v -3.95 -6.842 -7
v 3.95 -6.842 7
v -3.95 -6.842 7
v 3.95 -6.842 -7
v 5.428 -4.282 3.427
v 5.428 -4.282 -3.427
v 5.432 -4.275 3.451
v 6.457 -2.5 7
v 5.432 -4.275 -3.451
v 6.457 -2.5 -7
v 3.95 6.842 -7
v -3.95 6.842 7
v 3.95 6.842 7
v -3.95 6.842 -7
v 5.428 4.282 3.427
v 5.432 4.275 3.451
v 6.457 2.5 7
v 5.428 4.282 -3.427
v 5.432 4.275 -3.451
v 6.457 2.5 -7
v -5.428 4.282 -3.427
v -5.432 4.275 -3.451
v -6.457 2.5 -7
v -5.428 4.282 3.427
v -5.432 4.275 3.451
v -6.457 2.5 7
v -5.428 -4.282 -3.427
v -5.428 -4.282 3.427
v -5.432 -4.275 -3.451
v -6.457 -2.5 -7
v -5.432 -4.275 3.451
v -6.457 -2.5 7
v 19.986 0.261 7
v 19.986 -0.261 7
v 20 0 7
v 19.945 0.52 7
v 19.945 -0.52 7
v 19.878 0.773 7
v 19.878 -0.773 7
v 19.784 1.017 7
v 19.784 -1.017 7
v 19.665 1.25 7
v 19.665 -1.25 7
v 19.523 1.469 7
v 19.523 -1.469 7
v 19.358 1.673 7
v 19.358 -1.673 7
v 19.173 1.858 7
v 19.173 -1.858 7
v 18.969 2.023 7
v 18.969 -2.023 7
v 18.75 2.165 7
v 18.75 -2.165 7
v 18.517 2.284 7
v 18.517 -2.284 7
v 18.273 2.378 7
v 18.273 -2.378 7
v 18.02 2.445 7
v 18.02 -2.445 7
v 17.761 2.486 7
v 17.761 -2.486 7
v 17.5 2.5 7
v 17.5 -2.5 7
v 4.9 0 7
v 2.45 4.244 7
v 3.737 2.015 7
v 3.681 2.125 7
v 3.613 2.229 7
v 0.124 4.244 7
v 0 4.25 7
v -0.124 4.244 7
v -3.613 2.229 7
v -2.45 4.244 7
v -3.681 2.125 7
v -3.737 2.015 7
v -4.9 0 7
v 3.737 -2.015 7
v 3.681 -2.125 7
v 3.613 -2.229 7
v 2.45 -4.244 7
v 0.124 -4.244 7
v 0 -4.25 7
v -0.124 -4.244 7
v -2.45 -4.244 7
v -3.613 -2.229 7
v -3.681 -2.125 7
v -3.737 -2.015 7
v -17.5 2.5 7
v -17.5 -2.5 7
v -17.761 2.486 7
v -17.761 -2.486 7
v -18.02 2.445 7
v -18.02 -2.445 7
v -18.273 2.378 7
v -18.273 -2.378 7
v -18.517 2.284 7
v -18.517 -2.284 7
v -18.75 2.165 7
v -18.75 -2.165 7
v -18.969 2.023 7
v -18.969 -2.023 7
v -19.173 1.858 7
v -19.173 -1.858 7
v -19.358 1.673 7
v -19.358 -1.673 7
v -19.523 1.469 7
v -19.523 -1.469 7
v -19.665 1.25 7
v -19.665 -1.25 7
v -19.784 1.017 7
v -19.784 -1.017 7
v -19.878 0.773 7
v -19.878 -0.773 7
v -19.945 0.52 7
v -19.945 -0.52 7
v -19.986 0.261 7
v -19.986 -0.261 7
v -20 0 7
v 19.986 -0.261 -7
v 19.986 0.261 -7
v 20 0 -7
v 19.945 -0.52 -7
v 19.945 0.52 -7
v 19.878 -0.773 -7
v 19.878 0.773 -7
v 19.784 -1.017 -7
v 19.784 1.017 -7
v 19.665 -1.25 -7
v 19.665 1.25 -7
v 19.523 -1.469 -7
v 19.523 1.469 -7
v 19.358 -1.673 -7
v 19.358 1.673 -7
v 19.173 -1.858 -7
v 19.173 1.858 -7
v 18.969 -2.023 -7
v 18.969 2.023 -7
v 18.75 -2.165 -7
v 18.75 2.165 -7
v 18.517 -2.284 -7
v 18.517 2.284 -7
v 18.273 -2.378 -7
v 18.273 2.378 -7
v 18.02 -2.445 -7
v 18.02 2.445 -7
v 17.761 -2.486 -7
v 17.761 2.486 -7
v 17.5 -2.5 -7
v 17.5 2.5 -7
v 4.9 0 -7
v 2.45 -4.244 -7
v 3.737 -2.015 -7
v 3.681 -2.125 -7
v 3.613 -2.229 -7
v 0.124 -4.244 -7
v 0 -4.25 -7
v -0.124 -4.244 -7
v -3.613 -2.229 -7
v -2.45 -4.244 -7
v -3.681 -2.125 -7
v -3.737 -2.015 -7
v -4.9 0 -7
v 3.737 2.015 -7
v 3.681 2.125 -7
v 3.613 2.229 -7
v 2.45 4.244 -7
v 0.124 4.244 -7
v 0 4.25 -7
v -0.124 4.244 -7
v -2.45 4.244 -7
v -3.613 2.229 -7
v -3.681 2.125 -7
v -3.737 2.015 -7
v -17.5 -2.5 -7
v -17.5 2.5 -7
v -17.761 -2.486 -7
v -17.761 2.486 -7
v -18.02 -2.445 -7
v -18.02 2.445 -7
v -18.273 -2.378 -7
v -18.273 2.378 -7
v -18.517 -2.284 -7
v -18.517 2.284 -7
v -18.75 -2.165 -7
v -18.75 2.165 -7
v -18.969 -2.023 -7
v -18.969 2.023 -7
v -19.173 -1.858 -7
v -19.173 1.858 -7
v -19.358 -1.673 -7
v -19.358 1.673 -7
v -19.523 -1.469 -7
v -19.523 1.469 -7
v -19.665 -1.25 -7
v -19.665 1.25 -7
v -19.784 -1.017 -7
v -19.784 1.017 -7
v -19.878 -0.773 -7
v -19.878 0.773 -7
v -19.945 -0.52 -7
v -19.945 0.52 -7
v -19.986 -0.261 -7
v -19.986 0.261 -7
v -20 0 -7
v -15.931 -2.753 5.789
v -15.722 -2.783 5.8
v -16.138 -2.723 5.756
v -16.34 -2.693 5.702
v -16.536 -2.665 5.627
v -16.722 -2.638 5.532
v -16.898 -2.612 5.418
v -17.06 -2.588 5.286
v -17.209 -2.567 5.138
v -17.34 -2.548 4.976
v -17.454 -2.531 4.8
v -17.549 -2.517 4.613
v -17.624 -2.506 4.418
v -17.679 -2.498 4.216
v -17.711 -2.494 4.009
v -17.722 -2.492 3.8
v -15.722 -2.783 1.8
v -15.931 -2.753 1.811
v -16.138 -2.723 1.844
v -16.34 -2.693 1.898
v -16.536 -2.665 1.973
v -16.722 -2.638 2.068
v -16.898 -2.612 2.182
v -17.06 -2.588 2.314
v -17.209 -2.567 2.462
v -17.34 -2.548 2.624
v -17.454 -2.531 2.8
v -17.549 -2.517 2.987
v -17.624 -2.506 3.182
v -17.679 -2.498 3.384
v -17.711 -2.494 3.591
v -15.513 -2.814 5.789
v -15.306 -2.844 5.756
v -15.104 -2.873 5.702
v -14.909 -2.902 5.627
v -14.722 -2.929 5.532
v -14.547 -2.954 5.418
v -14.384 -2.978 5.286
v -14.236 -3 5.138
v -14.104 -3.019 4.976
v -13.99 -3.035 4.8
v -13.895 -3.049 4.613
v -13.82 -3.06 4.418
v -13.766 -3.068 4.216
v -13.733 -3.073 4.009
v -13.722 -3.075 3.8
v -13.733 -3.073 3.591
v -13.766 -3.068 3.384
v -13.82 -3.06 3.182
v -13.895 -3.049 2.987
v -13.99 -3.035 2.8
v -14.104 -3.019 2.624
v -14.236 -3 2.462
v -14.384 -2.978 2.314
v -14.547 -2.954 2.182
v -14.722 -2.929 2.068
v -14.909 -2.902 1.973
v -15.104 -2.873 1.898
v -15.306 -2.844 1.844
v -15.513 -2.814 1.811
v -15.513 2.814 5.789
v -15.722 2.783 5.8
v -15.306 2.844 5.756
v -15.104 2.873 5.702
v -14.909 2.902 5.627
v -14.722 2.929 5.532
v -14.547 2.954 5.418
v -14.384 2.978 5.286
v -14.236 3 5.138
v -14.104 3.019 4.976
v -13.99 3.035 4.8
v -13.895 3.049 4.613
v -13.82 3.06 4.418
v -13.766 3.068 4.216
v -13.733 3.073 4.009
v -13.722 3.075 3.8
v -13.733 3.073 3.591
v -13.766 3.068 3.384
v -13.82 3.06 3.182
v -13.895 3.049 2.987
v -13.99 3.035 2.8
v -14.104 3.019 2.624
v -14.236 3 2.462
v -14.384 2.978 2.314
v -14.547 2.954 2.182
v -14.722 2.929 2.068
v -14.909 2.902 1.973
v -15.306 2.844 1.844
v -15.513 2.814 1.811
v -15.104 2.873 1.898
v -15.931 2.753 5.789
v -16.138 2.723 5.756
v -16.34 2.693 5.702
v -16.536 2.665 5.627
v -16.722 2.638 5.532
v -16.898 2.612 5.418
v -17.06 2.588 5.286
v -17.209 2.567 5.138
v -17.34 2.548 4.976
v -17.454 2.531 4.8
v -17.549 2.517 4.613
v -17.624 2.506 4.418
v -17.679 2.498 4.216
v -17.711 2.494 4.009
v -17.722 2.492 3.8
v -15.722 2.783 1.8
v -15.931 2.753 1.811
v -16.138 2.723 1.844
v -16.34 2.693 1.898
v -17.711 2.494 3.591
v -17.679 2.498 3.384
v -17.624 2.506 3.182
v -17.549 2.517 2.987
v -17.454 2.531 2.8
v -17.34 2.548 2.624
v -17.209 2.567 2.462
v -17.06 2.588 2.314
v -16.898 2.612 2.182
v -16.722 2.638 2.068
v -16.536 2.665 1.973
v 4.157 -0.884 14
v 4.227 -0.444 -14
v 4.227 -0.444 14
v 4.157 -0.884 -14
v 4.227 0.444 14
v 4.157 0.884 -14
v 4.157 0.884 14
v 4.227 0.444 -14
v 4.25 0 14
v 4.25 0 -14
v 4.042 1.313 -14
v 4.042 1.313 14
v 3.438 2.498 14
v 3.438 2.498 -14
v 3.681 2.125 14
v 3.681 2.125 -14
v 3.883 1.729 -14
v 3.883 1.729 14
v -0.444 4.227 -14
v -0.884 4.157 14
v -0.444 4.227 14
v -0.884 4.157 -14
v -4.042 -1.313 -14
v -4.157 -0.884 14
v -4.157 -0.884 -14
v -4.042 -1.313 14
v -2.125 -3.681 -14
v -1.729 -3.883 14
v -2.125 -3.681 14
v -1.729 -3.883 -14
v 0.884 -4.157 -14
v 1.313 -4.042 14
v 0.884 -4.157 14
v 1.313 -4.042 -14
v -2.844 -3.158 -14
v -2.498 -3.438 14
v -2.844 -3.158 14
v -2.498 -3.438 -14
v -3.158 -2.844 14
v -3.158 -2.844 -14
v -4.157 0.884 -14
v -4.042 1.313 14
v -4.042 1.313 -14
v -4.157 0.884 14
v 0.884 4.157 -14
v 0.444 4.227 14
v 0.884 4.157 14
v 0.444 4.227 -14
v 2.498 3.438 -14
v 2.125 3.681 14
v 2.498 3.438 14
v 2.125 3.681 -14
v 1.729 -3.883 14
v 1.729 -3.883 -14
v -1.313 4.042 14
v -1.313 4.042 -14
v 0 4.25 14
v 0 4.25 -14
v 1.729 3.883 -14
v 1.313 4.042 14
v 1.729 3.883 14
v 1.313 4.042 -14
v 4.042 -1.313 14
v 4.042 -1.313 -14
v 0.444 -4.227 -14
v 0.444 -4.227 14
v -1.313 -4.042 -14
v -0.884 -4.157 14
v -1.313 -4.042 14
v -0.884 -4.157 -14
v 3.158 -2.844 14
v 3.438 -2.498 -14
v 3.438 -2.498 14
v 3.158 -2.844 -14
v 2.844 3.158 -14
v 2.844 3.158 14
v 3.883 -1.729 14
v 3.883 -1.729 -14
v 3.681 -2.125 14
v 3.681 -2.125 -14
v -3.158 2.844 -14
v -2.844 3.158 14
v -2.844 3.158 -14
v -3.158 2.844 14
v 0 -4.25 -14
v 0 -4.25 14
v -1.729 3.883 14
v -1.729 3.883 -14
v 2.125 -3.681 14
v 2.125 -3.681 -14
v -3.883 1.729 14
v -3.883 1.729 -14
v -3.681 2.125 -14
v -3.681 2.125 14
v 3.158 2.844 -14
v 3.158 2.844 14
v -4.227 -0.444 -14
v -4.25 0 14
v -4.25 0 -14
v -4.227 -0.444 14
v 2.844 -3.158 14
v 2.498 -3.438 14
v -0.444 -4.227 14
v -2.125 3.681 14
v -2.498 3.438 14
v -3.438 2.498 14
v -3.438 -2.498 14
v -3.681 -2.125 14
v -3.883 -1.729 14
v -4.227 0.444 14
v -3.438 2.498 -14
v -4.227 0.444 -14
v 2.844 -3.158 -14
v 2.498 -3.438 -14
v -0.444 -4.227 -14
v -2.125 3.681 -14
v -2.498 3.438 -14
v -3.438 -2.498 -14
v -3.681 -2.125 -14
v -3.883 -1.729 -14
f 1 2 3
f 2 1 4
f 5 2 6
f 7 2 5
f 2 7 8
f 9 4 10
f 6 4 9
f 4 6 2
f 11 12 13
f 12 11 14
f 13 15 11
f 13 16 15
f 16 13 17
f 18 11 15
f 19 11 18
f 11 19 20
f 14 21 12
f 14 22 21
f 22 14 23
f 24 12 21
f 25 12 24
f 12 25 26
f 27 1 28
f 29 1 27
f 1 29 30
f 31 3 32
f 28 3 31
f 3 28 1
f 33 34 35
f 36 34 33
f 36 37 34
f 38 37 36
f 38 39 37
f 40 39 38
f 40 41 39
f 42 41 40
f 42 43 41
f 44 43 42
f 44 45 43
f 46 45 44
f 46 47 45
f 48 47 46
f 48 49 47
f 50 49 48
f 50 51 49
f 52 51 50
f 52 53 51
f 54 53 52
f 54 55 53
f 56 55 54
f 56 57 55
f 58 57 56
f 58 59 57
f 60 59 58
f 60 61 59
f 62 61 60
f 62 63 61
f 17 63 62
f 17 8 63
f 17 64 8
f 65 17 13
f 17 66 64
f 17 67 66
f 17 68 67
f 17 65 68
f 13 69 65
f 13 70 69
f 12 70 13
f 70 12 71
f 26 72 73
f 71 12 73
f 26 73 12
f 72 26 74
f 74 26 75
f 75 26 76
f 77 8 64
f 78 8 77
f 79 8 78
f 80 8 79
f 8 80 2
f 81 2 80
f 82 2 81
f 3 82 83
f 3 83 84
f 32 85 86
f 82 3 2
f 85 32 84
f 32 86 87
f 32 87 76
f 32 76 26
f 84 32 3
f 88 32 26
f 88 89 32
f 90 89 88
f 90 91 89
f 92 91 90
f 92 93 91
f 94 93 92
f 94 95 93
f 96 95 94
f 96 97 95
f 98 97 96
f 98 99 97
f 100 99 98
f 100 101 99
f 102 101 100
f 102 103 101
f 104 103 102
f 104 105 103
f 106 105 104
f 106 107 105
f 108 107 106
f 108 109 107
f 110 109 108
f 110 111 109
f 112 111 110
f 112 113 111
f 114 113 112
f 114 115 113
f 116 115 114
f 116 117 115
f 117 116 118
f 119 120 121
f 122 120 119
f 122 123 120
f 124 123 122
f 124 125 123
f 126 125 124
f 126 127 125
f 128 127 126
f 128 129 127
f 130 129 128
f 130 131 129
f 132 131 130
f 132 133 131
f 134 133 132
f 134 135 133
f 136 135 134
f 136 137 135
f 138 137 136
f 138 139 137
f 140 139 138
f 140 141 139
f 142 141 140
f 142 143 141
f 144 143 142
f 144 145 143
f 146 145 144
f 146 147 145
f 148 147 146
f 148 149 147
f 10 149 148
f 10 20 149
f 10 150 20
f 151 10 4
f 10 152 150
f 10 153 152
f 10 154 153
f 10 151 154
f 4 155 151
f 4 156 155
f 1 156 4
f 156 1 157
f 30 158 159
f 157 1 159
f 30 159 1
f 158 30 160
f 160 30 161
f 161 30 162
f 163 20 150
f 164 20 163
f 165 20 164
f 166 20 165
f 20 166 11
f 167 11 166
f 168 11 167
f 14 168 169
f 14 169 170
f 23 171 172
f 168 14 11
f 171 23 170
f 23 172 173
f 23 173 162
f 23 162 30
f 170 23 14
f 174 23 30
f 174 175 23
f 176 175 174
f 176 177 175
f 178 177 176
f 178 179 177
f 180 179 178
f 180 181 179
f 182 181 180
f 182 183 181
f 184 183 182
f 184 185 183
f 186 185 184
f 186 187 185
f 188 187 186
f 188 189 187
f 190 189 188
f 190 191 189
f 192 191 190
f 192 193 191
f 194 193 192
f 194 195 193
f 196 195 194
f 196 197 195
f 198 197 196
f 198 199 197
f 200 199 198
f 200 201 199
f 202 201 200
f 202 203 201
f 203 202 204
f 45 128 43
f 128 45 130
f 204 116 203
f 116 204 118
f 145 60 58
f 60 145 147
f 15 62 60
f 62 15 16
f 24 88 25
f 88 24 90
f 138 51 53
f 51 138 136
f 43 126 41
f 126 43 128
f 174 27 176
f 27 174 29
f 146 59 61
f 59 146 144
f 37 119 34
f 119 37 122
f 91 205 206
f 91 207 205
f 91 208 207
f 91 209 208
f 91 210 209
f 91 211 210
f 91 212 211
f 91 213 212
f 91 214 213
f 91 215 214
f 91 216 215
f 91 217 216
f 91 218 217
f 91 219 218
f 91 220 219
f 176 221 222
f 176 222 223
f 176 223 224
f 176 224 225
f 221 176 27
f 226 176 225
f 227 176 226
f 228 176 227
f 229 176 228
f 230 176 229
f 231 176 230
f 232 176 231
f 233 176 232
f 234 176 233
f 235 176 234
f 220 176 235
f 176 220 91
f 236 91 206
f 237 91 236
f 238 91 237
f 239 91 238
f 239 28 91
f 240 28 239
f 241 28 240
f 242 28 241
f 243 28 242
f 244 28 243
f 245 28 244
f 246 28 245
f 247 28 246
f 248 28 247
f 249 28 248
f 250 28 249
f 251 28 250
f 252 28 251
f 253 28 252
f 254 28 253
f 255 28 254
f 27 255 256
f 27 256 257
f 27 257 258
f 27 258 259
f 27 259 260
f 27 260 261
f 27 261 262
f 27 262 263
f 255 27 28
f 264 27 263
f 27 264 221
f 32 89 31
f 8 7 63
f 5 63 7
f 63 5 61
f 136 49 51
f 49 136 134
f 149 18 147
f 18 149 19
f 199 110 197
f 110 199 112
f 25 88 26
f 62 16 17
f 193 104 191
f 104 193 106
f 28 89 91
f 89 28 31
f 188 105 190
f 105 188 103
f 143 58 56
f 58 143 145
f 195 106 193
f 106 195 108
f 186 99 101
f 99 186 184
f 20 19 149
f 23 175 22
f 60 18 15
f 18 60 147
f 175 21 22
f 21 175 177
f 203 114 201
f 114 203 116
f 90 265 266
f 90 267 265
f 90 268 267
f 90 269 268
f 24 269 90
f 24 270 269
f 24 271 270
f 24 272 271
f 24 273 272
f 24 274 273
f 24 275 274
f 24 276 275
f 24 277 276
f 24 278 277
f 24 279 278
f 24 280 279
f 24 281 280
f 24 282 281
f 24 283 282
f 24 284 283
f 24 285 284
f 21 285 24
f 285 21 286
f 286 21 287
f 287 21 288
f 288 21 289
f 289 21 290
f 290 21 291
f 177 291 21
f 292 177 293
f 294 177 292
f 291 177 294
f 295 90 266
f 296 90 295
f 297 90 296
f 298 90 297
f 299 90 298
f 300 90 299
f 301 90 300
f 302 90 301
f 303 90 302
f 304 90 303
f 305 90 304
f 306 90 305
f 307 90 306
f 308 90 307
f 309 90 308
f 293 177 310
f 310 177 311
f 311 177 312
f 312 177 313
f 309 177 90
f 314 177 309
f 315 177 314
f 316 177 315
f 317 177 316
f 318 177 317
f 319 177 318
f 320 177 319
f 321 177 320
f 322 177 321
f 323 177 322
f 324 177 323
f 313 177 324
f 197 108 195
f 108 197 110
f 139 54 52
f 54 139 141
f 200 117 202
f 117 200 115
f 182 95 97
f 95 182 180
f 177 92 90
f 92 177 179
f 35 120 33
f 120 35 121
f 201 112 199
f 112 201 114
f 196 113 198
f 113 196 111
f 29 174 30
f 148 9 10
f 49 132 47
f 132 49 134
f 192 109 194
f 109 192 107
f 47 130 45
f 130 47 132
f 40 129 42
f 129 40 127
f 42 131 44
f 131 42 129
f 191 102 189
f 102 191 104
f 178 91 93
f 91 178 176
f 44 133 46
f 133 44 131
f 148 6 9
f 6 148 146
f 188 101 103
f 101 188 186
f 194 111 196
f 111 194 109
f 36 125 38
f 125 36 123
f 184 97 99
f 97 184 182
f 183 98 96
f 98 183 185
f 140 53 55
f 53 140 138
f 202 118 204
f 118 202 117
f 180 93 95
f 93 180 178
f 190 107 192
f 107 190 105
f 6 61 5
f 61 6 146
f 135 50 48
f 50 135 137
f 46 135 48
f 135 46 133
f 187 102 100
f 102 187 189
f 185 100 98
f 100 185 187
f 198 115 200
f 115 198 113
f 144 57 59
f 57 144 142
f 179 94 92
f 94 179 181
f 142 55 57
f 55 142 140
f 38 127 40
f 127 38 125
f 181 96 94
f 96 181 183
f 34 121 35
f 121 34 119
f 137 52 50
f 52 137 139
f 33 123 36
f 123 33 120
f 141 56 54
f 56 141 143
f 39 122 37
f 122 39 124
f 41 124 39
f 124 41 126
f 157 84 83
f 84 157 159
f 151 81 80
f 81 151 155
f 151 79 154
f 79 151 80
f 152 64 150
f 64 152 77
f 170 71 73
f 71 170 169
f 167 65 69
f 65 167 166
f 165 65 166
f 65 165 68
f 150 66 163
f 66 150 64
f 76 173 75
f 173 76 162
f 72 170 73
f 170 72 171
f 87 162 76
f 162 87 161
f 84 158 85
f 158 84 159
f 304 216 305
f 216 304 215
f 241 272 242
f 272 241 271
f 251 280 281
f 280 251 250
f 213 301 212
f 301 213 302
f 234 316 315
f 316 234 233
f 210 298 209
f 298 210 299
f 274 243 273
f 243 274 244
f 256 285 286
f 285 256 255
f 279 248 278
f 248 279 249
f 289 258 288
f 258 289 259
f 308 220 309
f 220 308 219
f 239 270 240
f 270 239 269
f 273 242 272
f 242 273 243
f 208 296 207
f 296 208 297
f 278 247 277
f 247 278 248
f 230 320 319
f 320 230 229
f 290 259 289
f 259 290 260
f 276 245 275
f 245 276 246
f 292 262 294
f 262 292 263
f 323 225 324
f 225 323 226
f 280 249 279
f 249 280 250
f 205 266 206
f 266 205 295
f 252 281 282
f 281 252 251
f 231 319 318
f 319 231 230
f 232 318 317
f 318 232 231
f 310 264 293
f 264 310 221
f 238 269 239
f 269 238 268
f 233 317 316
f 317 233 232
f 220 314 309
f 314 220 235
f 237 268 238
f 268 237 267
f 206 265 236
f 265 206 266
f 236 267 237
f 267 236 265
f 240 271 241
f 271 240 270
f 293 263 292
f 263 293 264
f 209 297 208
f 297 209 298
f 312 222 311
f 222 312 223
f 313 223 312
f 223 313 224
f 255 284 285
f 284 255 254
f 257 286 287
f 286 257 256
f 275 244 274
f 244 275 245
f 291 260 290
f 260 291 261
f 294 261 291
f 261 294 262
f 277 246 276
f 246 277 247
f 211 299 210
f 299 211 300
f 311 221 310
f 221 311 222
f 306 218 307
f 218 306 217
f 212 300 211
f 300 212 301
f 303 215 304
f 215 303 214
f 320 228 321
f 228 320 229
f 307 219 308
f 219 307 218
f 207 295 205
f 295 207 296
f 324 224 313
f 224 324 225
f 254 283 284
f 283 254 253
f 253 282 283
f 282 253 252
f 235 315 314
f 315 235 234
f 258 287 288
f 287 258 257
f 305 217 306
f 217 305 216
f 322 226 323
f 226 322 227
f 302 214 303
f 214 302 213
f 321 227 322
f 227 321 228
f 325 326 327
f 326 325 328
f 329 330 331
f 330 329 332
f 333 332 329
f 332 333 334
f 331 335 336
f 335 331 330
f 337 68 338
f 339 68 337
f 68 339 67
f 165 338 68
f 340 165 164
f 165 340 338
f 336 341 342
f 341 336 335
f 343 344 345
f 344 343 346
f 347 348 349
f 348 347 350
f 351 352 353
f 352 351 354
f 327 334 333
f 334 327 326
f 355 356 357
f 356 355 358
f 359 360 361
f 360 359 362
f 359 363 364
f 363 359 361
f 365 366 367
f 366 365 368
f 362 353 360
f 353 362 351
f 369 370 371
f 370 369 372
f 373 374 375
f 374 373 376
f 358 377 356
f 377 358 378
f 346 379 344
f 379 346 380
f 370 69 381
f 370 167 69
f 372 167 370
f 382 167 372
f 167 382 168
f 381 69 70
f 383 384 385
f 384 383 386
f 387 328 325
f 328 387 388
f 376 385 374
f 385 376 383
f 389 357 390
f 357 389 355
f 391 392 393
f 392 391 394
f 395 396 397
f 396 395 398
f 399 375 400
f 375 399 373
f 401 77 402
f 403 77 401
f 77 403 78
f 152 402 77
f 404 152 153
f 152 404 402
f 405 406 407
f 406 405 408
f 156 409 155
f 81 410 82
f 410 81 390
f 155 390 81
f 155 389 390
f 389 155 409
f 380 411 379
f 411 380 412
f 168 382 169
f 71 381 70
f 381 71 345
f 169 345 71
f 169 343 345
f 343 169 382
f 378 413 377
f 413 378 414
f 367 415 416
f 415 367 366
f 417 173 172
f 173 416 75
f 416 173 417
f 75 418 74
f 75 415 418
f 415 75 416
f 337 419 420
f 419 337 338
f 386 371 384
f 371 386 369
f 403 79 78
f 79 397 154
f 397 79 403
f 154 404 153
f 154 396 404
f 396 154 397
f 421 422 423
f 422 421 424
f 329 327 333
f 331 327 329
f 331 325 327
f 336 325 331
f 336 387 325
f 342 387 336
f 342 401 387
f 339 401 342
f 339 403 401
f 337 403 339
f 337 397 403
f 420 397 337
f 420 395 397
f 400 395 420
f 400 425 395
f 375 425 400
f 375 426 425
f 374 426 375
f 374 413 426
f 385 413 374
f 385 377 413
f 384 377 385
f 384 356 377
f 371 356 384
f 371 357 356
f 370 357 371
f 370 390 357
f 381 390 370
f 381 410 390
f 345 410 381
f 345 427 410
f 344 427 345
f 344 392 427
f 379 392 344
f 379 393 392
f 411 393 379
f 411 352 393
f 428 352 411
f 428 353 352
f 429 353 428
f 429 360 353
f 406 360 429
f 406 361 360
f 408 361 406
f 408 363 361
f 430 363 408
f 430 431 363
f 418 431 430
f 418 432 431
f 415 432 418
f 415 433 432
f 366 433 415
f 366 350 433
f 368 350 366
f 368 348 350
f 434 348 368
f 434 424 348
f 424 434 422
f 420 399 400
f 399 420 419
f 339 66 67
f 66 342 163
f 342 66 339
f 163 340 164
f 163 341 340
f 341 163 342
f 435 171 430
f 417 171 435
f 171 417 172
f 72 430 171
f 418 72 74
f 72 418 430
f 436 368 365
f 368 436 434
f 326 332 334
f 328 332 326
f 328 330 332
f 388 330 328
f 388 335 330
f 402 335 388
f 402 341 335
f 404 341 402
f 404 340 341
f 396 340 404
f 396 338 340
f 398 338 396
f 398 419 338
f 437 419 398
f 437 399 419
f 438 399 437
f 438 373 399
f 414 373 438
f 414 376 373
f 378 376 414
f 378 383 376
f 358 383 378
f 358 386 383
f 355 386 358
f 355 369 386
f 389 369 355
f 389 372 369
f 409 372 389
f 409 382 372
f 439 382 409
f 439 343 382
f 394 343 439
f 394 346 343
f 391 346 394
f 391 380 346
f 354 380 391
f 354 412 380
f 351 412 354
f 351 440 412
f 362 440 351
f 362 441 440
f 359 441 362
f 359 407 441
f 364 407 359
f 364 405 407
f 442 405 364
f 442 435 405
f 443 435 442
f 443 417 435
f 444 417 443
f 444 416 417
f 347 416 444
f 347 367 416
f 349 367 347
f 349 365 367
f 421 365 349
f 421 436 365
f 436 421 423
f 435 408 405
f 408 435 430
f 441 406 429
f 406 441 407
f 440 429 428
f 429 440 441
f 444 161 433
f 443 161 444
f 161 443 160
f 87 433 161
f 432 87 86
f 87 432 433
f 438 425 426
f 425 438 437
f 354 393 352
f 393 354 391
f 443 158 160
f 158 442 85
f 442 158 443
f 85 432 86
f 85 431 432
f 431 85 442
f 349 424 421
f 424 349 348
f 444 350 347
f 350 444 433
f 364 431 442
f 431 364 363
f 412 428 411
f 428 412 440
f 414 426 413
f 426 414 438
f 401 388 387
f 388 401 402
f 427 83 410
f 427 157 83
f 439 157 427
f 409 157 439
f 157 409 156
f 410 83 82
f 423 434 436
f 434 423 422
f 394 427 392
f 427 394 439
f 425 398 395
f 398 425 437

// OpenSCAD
/*
    Customizable Two-Sided Keyring Thumb Spanner
    
    Set the 'testing' variable to 1 and then use the test_diameter variable to help you size the edge to edge diameter (upper_dia/lower_dia) to get the correct size for your spanner. Add in some tolerance for material shrinkage.
    
    Try to keep the lower_dia variable as your smaller spanner to avoid needing support. Remember to add tolerance for any shrinking you get, it can be worse closer to the heated bed.
    
    - by Harlo
    - 22/05/2016.
    
        ADDING TEXT:
    
        *   Don't forget to add in a reference to your desired font. Use variable 'font_var' to load your desired font into all the text modules automatically.
        **  Uncomment the text modules and the cutting references if you plan on adding them in.
        *** There are two text versions/options in the wrench_outer() module. Either use both the text_8mm (lower) & text_10mm (upper) modules together OR the text_any_mm(). Avoid using both.
*/

//Set to '0' for your final render
testing = 1; //[0,1]
//Edge to Edge Length
test_diameter = 8.5; //[0.1:0.1:20]
//Main Diameter Upper - set to accomodate the tube
upper_dia = 9.8; // [0.5:0.1:30]
//Main Diameter Lower - set to accomodate the tube
lower_dia = 9.8; //[0.5:0.1:30]
//Main Handle Thickness
handle_thickness = 5; //[5:0.1:20]
//Secondary Handle Thickness
handle_thickness_2 = 10; //[0:0.1:40]
//Wall thickness (around the nut)
additional_thickness = 3; //[2:0.1:15]
//Z Height
height = 14; //[3:0.1:60]
//Length of the handle
length = 35; //[25:0.1:100]




//Internal

key_ring_dia = 4*1;
key_ring_z_scale = 1*1;
key_ring_res = 60*1;



wrench_outer();

if (testing == 1){
    test_cut_cylinder();
}

/*
module text_10mm(){
    translate([0,-(upper_dia+additional_thickness)/2,height/4]){
        rotate([270,0,180]){
            text_module("8", 4.5);
        }
    }
}

module text_8mm(){
    translate([0,-(upper_dia+additional_thickness)/2,-height/4]){
        rotate([270,0,180]){
            text_module("8", 4.5);
        }
    }
}

module text_any_mm(){
    translate([0,-(upper_dia+additional_thickness)/2,0]){
        rotate([270,0,180]){
            text_module(label, label_size);
        }
    }
}

module text_module(text_in, text_size){
    scale([1,1,0.01])
    {
        linear_extrude(h = 1, center = true, convexity = 4) {
            text (text_in, size = text_size,font = font_var, halign = "center", valign = "center", $fn = 32 );
        }
    }
}

*/
          

module wrench_outer(){
    difference(){
        union(){
            cylinder(h = height ,d = upper_dia + additional_thickness*2, center = true, $fn = 6);
            handles();
            
        }
        inner_cuts();
        key_ring_cut();        
        //text_10mm(); //TOP
        //text_8mm(); //BOTTOM
        //text_any_mm(); //CENTER
    }
}



module test_cut_cylinder(){
      cylinder(h = height*2 ,d = test_diameter, center = true, $fn = 60);
}


module key_ring_cut(){
    translate([-length/2 + key_ring_dia/2.25,0,height/2 - (key_ring_dia * key_ring_z_scale)/1.25]){
        rotate([90,0,0]){
            scale([1,key_ring_z_scale,1]){
                cylinder(h = handle_thickness*2, d = key_ring_dia, center = true, $fn = key_ring_res);
            }
        }
    }
    
}


module handles(){
    hull(){
        translate([-length/2,0,0]){
            cylinder(h = height, d = handle_thickness, center = true, $fn = 60);
        }
        translate([length/2,0,0]){
            cylinder(h = height, d = handle_thickness, center = true, $fn = 60);
        }
        
        translate([0,0,2]){
            rotate([0,90,0]){    
                cylinder(h = 1, d = handle_thickness_2, center = true, $fn = 4);
            }
        }
        translate([0,0,-2]){
            rotate([0,90,0]){    
                cylinder(h = 1, d = handle_thickness_2, center = true, $fn = 4);
            }
        }
        
    }
}

module inner_cuts(){
    translate([0,0,height/2]){
        cylinder (h = height, d = upper_dia, center = true, $fn = 6);
    }
    
    translate([0,0,-height/2]){
        cylinder (h = height, d = lower_dia, center = true, $fn = 6);
    }
}
